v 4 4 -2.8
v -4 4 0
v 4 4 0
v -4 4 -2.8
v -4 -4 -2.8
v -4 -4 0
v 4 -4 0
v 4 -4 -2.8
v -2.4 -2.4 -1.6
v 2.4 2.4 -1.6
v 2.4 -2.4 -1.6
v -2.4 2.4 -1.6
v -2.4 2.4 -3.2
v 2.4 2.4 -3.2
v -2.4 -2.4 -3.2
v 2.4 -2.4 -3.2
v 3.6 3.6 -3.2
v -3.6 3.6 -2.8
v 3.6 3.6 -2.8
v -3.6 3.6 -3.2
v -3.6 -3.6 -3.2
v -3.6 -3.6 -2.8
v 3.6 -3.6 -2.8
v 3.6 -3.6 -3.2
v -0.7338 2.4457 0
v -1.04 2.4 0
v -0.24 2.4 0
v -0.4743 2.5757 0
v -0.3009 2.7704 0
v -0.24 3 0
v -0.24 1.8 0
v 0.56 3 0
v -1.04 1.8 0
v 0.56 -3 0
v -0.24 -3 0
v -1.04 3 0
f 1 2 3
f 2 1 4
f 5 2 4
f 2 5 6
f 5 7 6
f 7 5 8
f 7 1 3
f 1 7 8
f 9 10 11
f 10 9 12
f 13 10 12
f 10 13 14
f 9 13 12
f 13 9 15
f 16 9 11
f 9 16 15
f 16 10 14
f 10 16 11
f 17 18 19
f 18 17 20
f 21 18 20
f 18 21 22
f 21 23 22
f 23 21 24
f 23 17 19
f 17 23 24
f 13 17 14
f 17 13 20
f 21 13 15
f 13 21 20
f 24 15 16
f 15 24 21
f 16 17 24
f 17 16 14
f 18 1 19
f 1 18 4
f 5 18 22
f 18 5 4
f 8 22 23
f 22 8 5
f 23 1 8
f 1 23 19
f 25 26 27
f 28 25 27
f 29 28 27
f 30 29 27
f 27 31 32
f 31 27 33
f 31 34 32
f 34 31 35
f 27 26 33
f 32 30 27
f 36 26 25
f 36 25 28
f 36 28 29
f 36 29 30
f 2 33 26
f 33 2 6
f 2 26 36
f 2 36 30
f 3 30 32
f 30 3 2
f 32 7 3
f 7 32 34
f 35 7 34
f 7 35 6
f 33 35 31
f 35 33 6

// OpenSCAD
// file: ../p/box5.scad
use <../lib.scad>
function ldraw_lib__box5() = [
// 0 Box with 5 Faces and All Edges
// 0 Name: box5.dat
// 0 Author: James Jessiman
// 0 !LDRAW_ORG Primitive UPDATE 2012-01
// 0 !LICENSE Licensed under CC BY 4.0 : see CAreadme.txt
// 
// 0 BFC CERTIFY CCW
  [0,"BFC","CERTIFY"],
  [0,"BFC","CCW"],
// 
// 0 !HISTORY 2002-04-03 [sbliss] Modified for BFC compliance
// 0 !HISTORY 2002-04-25 [PTadmin] Official Update 2002-02
// 0 !HISTORY 2007-06-24 [PTadmin] Header formatted for Contributor Agreement
// 0 !HISTORY 2008-07-01 [PTadmin] Official Update 2008-01
// 0 !HISTORY 2012-02-16 [Philo] Changed to CCW
// 0 !HISTORY 2012-03-30 [PTadmin] Official Update 2012-01
// 
// 
// 2 24 1 1 1 -1 1 1
  [2,24,1,1,1,-1,1,1],
// 2 24 -1 1 1 -1 1 -1
  [2,24,-1,1,1,-1,1,-1],
// 2 24 -1 1 -1 1 1 -1
  [2,24,-1,1,-1,1,1,-1],
// 2 24 1 1 -1 1 1 1
  [2,24,1,1,-1,1,1,1],
// 2 24 1 0 1 -1 0 1
  [2,24,1,0,1,-1,0,1],
// 2 24 -1 0 1 -1 0 -1
  [2,24,-1,0,1,-1,0,-1],
// 2 24 -1 0 -1 1 0 -1
  [2,24,-1,0,-1,1,0,-1],
// 2 24 1 0 -1 1 0 1
  [2,24,1,0,-1,1,0,1],
// 2 24 1 0 1 1 1 1
  [2,24,1,0,1,1,1,1],
// 2 24 -1 0 1 -1 1 1
  [2,24,-1,0,1,-1,1,1],
// 2 24 1 0 -1 1 1 -1
  [2,24,1,0,-1,1,1,-1],
// 2 24 -1 0 -1 -1 1 -1
  [2,24,-1,0,-1,-1,1,-1],
// 4 16 -1 1 1 1 1 1 1 1 -1 -1 1 -1
  [4,16,-1,1,1,1,1,1,1,1,-1,-1,1,-1],
// 4 16 -1 1 1 -1 0 1 1 0 1 1 1 1
  [4,16,-1,1,1,-1,0,1,1,0,1,1,1,1],
// 4 16 -1 1 -1 -1 0 -1 -1 0 1 -1 1 1
  [4,16,-1,1,-1,-1,0,-1,-1,0,1,-1,1,1],
// 4 16 1 1 -1 1 0 -1 -1 0 -1 -1 1 -1
  [4,16,1,1,-1,1,0,-1,-1,0,-1,-1,1,-1],
// 4 16 1 1 1 1 0 1 1 0 -1 1 1 -1
  [4,16,1,1,1,1,0,1,1,0,-1,1,1,-1],
];
module ldraw_lib__box5(step=0, col=false, unit=2/5, alt=false, line=0.2, solid=!$preview)
    makepoly(ldraw_lib__box5(), step=step, col=col, unit=unit, alt=alt, line=line, solid=solid);
ldraw_lib__box5(line=0.2);
// file: ../p/box4.scad
use <../lib.scad>
function ldraw_lib__box4() = [
// 0 Box with 4 Faces (2 Parallel Pairs) and All Edges
// 0 Name: box4.dat
// 0 Author: James Jessiman
// 0 !LDRAW_ORG Primitive UPDATE 2012-01
// 0 !LICENSE Licensed under CC BY 4.0 : see CAreadme.txt
// 
// 0 BFC CERTIFY CCW
  [0,"BFC","CERTIFY"],
  [0,"BFC","CCW"],
// 
// 0 !HISTORY 2002-04-03 [sbliss] Modified for BFC compliance
// 0 !HISTORY 2002-04-25 [PTadmin] Official Update 2002-02
// 0 !HISTORY 2007-06-24 [PTadmin] Header formatted for Contributor Agreement
// 0 !HISTORY 2008-07-01 [PTadmin] Official Update 2008-01
// 0 !HISTORY 2012-02-16 [Philo] Changed to CCW
// 0 !HISTORY 2012-03-30 [PTadmin] Official Update 2012-01
// 
// 
// 2 24 1 1 1 -1 1 1
  [2,24,1,1,1,-1,1,1],
// 2 24 -1 1 1 -1 1 -1
  [2,24,-1,1,1,-1,1,-1],
// 2 24 -1 1 -1 1 1 -1
  [2,24,-1,1,-1,1,1,-1],
// 2 24 1 1 -1 1 1 1
  [2,24,1,1,-1,1,1,1],
// 2 24 1 0 1 -1 0 1
  [2,24,1,0,1,-1,0,1],
// 2 24 -1 0 1 -1 0 -1
  [2,24,-1,0,1,-1,0,-1],
// 2 24 -1 0 -1 1 0 -1
  [2,24,-1,0,-1,1,0,-1],
// 2 24 1 0 -1 1 0 1
  [2,24,1,0,-1,1,0,1],
// 2 24 1 0 1 1 1 1
  [2,24,1,0,1,1,1,1],
// 2 24 -1 0 1 -1 1 1
  [2,24,-1,0,1,-1,1,1],
// 2 24 1 0 -1 1 1 -1
  [2,24,1,0,-1,1,1,-1],
// 2 24 -1 0 -1 -1 1 -1
  [2,24,-1,0,-1,-1,1,-1],
// 4 16 -1 1 1 -1 0 1 1 0 1 1 1 1
  [4,16,-1,1,1,-1,0,1,1,0,1,1,1,1],
// 4 16 -1 1 -1 -1 0 -1 -1 0 1 -1 1 1
  [4,16,-1,1,-1,-1,0,-1,-1,0,1,-1,1,1],
// 4 16 1 1 -1 1 0 -1 -1 0 -1 -1 1 -1
  [4,16,1,1,-1,1,0,-1,-1,0,-1,-1,1,-1],
// 4 16 1 1 1 1 0 1 1 0 -1 1 1 -1
  [4,16,1,1,1,1,0,1,1,0,-1,1,1,-1],
];
module ldraw_lib__box4(step=0, col=false, unit=2/5, alt=false, line=0.2, solid=!$preview)
    makepoly(ldraw_lib__box4(), step=step, col=col, unit=unit, alt=alt, line=line, solid=solid);
ldraw_lib__box4(line=0.2);
// file: s/3070bs01.scad
use <../../lib.scad>
use <../../p/box4.scad>
use <../../p/box5.scad>
function ldraw_lib__s__3070bs01() = [
// 0 ~Tile  1 x  1 with Groove without Top Face
// 0 Name: s\3070bs01.dat
// 0 Author: Chris Dee [cwdee]
// 0 !LDRAW_ORG Subpart UPDATE 2009-02
// 0 !LICENSE Licensed under CC BY 4.0 : see CAreadme.txt
// 
// 0 BFC CERTIFY CCW
  [0,"BFC","CERTIFY"],
  [0,"BFC","CCW"],
// 
// 0 !HISTORY 2009-09-03 [PTadmin] Official Update 2009-02
// 
// 
// 1 16 0 0 0 10 0 0 0 7 0 0 0 10 box4.dat
  [1,16,0,0,0,10,0,0,0,7,0,0,0,10, ldraw_lib__box4()],
// 0 BFC INVERTNEXT
  [0,"BFC","INVERTNEXT"],
// 1 16 0 8 0 6 0 0 0 -4 0 0 0 6 box5.dat
  [1,16,0,8,0,6,0,0,0,-4,0,0,0,6, ldraw_lib__box5()],
// 1 16 0 7 0 9 0 0 0 1 0 0 0 9 box4.dat
  [1,16,0,7,0,9,0,0,0,1,0,0,0,9, ldraw_lib__box4()],
// 
// 4 16 9 8 9 6 8 6 -6 8 6 -9 8 9
  [4,16,9,8,9,6,8,6,-6,8,6,-9,8,9],
// 4 16 -9 8 9 -6 8 6 -6 8 -6 -9 8 -9
  [4,16,-9,8,9,-6,8,6,-6,8,-6,-9,8,-9],
// 4 16 -9 8 -9 -6 8 -6 6 8 -6 9 8 -9
  [4,16,-9,8,-9,-6,8,-6,6,8,-6,9,8,-9],
// 4 16 9 8 -9 6 8 -6 6 8 6 9 8 9
  [4,16,9,8,-9,6,8,-6,6,8,6,9,8,9],
// 
// 4 16 10 7 10 9 7 9 -9 7 9 -10 7 10
  [4,16,10,7,10,9,7,9,-9,7,9,-10,7,10],
// 4 16 -10 7 10 -9 7 9 -9 7 -9 -10 7 -10
  [4,16,-10,7,10,-9,7,9,-9,7,-9,-10,7,-10],
// 4 16 -10 7 -10 -9 7 -9 9 7 -9 10 7 -10
  [4,16,-10,7,-10,-9,7,-9,9,7,-9,10,7,-10],
// 4 16 10 7 -10 9 7 -9 9 7 9 10 7 10
  [4,16,10,7,-10,9,7,-9,9,7,9,10,7,10],
// 0
];
module ldraw_lib__s__3070bs01(step=0, col=false, unit=2/5, alt=false, line=0.2, solid=!$preview)
    makepoly(ldraw_lib__s__3070bs01(), step=step, col=col, unit=unit, alt=alt, line=line, solid=solid);
ldraw_lib__s__3070bs01(line=0.2);
// file: ../p/1-4ndis.scad
use <../lib.scad>
function ldraw_lib__1_4ndis() = [
// 0 Disc Negative 0.25
// 0 Name: 1-4ndis.dat
// 0 Author: James Jessiman
// 0 !LDRAW_ORG Primitive UPDATE 2012-01
// 0 !LICENSE Licensed under CC BY 4.0 : see CAreadme.txt
// 
// 0 BFC CERTIFY CCW
  [0,"BFC","CERTIFY"],
  [0,"BFC","CCW"],
// 
// 0 !HISTORY 2002-03-23 [sbliss] Added BFC Statement
// 0 !HISTORY 2002-04-25 [PTadmin] Official Update 2002-02
// 0 !HISTORY 2007-06-22 [PTadmin] Header formatted for Contributor Agreement
// 0 !HISTORY 2008-07-01 [PTadmin] Official Update 2008-01
// 0 !HISTORY 2012-02-16 [Philo] Changed to CCW
// 0 !HISTORY 2012-03-30 [PTadmin] Official Update 2012-01
// 
// 
// 3 16 0.9239 0 0.3827 1 0 0 1 0 1
  [3,16,0.9239,0,0.3827,1,0,0,1,0,1],
// 3 16 0.7071 0 0.7071 0.9239 0 0.3827 1 0 1
  [3,16,0.7071,0,0.7071,0.9239,0,0.3827,1,0,1],
// 3 16 0.3827 0 0.9239 0.7071 0 0.7071 1 0 1
  [3,16,0.3827,0,0.9239,0.7071,0,0.7071,1,0,1],
// 3 16 0 0 1 0.3827 0 0.9239 1 0 1
  [3,16,0,0,1,0.3827,0,0.9239,1,0,1],
];
module ldraw_lib__1_4ndis(step=0, col=false, unit=2/5, alt=false, line=0.2, solid=!$preview)
    makepoly(ldraw_lib__1_4ndis(), step=step, col=col, unit=unit, alt=alt, line=line, solid=solid);
ldraw_lib__1_4ndis(line=0.2);
// file: ../p/1-4disc.scad
use <../lib.scad>
function ldraw_lib__1_4disc() = [
// 0 Disc 0.25
// 0 Name: 1-4disc.dat
// 0 Author: James Jessiman
// 0 !LDRAW_ORG Primitive UPDATE 2002-02
// 0 !LICENSE Licensed under CC BY 4.0 : see CAreadme.txt
// 
// 0 BFC CERTIFY CCW
  [0,"BFC","CERTIFY"],
  [0,"BFC","CCW"],
// 
// 0 !HISTORY 2002-03-23 [sbliss] Added BFC statement.
// 0 !HISTORY 2002-04-25 [PTadmin] Official Update 2002-02
// 0 !HISTORY 2007-06-22 [PTadmin] Header formatted for Contributor Agreement
// 0 !HISTORY 2008-07-01 [PTadmin] Official Update 2008-01
// 
// 
// 3 16 0 0 0 1 0 0 0.9239 0 0.3827
  [3,16,0,0,0,1,0,0,0.9239,0,0.3827],
// 3 16 0 0 0 0.9239 0 0.3827 0.7071 0 0.7071
  [3,16,0,0,0,0.9239,0,0.3827,0.7071,0,0.7071],
// 3 16 0 0 0 0.7071 0 0.7071 0.3827 0 0.9239
  [3,16,0,0,0,0.7071,0,0.7071,0.3827,0,0.9239],
// 3 16 0 0 0 0.3827 0 0.9239 0 0 1
  [3,16,0,0,0,0.3827,0,0.9239,0,0,1],
// 0
];
module ldraw_lib__1_4disc(step=0, col=false, unit=2/5, alt=false, line=0.2, solid=!$preview)
    makepoly(ldraw_lib__1_4disc(), step=step, col=col, unit=unit, alt=alt, line=line, solid=solid);
ldraw_lib__1_4disc(line=0.2);
// main file
use <../lib.scad>
use <../p/1-4disc.scad>
use <../p/1-4ndis.scad>
use <s/3070bs01.scad>
function ldraw_lib__3070bpv1() = [
// 0 Tile  1 x  1 with Silver "1" Pattern
// 0 Name: 3070bpv1.dat
// 0 Author: Magnus Forsberg [MagFors]
// 0 !LDRAW_ORG Part UPDATE 2015-02
// 0 !LICENSE Licensed under CC BY 4.0 : see CAreadme.txt
// 
// 0 BFC CERTIFY CCW
  [0,"BFC","CERTIFY"],
  [0,"BFC","CCW"],
// 
// 0 !KEYWORDS BrickLink 3070pb061, Rebrickable 3070bpr0089, Set 850425
// 
// 0 !HISTORY 2015-12-30 [PTadmin] Official Update 2015-02
// 
// 
// 1 16 0 0 0 1 0 0 0 1 0 0 0 1 s\3070bs01.dat
  [1,16,0,0,0,1,0,0,0,1,0,0,0,1, ldraw_lib__s__3070bs01()],
// 
// 1 80 -2.6 0 7.5 0 0 2 0 1 0 -1.5 0 0 1-4ndis.dat
  [1,80,-2.6,0,7.5,0,0,2,0,1,0,-1.5,0,0, ldraw_lib__1_4ndis()],
// 4 80 -0.6 0 6 -2.6 0 4.5 -0.6 0 4.5 1.4 0 7.5
  [4,80,-0.6,0,6,-2.6,0,4.5,-0.6,0,4.5,1.4,0,7.5],
// 4 80 -0.6 0 4.5 -0.6 0 -7.5 1.4 0 -7.5 1.4 0 7.5
  [4,80,-0.6,0,4.5,-0.6,0,-7.5,1.4,0,-7.5,1.4,0,7.5],
// 3 80 -0.6 0 6 -2.6 0 6 -2.6 0 4.5
  [3,80,-0.6,0,6,-2.6,0,6,-2.6,0,4.5],
// 3 80 1.4 0 7.5 -0.6 0 7.5 -0.6 0 6
  [3,80,1.4,0,7.5,-0.6,0,7.5,-0.6,0,6],
// 
// 1 16 -2.6 0 7.5 0 0 2 0 1 0 -1.5 0 0 1-4disc.dat
  [1,16,-2.6,0,7.5,0,0,2,0,1,0,-1.5,0,0, ldraw_lib__1_4disc()],
// 4 16 -2.6 0 4.5 -2.6 0 6 -10 0 10 -10 0 -10
  [4,16,-2.6,0,4.5,-2.6,0,6,-10,0,10,-10,0,-10],
// 3 16 -10 0 10 -2.6 0 6 -2.6 0 7.5
  [3,16,-10,0,10,-2.6,0,6,-2.6,0,7.5],
// 3 16 -10 0 10 -2.6 0 7.5 -0.6 0 7.5
  [3,16,-10,0,10,-2.6,0,7.5,-0.6,0,7.5],
// 4 16 -10 0 10 -0.6 0 7.5 1.4 0 7.5 10 0 10
  [4,16,-10,0,10,-0.6,0,7.5,1.4,0,7.5,10,0,10],
// 4 16 1.4 0 7.5 1.4 0 -7.5 10 0 -10 10 0 10
  [4,16,1.4,0,7.5,1.4,0,-7.5,10,0,-10,10,0,10],
// 4 16 -0.6 0 -7.5 -10 0 -10 10 0 -10 1.4 0 -7.5
  [4,16,-0.6,0,-7.5,-10,0,-10,10,0,-10,1.4,0,-7.5],
// 4 16 -2.6 0 4.5 -10 0 -10 -0.6 0 -7.5 -0.6 0 4.5
  [4,16,-2.6,0,4.5,-10,0,-10,-0.6,0,-7.5,-0.6,0,4.5],
];
module ldraw_lib__3070bpv1(step=0, col=false, unit=2/5, alt=false, line=0.2, solid=!$preview)
    makepoly(ldraw_lib__3070bpv1(), step=step, col=col, unit=unit, alt=alt, line=line, solid=solid);
ldraw_lib__3070bpv1(line=0.2);
